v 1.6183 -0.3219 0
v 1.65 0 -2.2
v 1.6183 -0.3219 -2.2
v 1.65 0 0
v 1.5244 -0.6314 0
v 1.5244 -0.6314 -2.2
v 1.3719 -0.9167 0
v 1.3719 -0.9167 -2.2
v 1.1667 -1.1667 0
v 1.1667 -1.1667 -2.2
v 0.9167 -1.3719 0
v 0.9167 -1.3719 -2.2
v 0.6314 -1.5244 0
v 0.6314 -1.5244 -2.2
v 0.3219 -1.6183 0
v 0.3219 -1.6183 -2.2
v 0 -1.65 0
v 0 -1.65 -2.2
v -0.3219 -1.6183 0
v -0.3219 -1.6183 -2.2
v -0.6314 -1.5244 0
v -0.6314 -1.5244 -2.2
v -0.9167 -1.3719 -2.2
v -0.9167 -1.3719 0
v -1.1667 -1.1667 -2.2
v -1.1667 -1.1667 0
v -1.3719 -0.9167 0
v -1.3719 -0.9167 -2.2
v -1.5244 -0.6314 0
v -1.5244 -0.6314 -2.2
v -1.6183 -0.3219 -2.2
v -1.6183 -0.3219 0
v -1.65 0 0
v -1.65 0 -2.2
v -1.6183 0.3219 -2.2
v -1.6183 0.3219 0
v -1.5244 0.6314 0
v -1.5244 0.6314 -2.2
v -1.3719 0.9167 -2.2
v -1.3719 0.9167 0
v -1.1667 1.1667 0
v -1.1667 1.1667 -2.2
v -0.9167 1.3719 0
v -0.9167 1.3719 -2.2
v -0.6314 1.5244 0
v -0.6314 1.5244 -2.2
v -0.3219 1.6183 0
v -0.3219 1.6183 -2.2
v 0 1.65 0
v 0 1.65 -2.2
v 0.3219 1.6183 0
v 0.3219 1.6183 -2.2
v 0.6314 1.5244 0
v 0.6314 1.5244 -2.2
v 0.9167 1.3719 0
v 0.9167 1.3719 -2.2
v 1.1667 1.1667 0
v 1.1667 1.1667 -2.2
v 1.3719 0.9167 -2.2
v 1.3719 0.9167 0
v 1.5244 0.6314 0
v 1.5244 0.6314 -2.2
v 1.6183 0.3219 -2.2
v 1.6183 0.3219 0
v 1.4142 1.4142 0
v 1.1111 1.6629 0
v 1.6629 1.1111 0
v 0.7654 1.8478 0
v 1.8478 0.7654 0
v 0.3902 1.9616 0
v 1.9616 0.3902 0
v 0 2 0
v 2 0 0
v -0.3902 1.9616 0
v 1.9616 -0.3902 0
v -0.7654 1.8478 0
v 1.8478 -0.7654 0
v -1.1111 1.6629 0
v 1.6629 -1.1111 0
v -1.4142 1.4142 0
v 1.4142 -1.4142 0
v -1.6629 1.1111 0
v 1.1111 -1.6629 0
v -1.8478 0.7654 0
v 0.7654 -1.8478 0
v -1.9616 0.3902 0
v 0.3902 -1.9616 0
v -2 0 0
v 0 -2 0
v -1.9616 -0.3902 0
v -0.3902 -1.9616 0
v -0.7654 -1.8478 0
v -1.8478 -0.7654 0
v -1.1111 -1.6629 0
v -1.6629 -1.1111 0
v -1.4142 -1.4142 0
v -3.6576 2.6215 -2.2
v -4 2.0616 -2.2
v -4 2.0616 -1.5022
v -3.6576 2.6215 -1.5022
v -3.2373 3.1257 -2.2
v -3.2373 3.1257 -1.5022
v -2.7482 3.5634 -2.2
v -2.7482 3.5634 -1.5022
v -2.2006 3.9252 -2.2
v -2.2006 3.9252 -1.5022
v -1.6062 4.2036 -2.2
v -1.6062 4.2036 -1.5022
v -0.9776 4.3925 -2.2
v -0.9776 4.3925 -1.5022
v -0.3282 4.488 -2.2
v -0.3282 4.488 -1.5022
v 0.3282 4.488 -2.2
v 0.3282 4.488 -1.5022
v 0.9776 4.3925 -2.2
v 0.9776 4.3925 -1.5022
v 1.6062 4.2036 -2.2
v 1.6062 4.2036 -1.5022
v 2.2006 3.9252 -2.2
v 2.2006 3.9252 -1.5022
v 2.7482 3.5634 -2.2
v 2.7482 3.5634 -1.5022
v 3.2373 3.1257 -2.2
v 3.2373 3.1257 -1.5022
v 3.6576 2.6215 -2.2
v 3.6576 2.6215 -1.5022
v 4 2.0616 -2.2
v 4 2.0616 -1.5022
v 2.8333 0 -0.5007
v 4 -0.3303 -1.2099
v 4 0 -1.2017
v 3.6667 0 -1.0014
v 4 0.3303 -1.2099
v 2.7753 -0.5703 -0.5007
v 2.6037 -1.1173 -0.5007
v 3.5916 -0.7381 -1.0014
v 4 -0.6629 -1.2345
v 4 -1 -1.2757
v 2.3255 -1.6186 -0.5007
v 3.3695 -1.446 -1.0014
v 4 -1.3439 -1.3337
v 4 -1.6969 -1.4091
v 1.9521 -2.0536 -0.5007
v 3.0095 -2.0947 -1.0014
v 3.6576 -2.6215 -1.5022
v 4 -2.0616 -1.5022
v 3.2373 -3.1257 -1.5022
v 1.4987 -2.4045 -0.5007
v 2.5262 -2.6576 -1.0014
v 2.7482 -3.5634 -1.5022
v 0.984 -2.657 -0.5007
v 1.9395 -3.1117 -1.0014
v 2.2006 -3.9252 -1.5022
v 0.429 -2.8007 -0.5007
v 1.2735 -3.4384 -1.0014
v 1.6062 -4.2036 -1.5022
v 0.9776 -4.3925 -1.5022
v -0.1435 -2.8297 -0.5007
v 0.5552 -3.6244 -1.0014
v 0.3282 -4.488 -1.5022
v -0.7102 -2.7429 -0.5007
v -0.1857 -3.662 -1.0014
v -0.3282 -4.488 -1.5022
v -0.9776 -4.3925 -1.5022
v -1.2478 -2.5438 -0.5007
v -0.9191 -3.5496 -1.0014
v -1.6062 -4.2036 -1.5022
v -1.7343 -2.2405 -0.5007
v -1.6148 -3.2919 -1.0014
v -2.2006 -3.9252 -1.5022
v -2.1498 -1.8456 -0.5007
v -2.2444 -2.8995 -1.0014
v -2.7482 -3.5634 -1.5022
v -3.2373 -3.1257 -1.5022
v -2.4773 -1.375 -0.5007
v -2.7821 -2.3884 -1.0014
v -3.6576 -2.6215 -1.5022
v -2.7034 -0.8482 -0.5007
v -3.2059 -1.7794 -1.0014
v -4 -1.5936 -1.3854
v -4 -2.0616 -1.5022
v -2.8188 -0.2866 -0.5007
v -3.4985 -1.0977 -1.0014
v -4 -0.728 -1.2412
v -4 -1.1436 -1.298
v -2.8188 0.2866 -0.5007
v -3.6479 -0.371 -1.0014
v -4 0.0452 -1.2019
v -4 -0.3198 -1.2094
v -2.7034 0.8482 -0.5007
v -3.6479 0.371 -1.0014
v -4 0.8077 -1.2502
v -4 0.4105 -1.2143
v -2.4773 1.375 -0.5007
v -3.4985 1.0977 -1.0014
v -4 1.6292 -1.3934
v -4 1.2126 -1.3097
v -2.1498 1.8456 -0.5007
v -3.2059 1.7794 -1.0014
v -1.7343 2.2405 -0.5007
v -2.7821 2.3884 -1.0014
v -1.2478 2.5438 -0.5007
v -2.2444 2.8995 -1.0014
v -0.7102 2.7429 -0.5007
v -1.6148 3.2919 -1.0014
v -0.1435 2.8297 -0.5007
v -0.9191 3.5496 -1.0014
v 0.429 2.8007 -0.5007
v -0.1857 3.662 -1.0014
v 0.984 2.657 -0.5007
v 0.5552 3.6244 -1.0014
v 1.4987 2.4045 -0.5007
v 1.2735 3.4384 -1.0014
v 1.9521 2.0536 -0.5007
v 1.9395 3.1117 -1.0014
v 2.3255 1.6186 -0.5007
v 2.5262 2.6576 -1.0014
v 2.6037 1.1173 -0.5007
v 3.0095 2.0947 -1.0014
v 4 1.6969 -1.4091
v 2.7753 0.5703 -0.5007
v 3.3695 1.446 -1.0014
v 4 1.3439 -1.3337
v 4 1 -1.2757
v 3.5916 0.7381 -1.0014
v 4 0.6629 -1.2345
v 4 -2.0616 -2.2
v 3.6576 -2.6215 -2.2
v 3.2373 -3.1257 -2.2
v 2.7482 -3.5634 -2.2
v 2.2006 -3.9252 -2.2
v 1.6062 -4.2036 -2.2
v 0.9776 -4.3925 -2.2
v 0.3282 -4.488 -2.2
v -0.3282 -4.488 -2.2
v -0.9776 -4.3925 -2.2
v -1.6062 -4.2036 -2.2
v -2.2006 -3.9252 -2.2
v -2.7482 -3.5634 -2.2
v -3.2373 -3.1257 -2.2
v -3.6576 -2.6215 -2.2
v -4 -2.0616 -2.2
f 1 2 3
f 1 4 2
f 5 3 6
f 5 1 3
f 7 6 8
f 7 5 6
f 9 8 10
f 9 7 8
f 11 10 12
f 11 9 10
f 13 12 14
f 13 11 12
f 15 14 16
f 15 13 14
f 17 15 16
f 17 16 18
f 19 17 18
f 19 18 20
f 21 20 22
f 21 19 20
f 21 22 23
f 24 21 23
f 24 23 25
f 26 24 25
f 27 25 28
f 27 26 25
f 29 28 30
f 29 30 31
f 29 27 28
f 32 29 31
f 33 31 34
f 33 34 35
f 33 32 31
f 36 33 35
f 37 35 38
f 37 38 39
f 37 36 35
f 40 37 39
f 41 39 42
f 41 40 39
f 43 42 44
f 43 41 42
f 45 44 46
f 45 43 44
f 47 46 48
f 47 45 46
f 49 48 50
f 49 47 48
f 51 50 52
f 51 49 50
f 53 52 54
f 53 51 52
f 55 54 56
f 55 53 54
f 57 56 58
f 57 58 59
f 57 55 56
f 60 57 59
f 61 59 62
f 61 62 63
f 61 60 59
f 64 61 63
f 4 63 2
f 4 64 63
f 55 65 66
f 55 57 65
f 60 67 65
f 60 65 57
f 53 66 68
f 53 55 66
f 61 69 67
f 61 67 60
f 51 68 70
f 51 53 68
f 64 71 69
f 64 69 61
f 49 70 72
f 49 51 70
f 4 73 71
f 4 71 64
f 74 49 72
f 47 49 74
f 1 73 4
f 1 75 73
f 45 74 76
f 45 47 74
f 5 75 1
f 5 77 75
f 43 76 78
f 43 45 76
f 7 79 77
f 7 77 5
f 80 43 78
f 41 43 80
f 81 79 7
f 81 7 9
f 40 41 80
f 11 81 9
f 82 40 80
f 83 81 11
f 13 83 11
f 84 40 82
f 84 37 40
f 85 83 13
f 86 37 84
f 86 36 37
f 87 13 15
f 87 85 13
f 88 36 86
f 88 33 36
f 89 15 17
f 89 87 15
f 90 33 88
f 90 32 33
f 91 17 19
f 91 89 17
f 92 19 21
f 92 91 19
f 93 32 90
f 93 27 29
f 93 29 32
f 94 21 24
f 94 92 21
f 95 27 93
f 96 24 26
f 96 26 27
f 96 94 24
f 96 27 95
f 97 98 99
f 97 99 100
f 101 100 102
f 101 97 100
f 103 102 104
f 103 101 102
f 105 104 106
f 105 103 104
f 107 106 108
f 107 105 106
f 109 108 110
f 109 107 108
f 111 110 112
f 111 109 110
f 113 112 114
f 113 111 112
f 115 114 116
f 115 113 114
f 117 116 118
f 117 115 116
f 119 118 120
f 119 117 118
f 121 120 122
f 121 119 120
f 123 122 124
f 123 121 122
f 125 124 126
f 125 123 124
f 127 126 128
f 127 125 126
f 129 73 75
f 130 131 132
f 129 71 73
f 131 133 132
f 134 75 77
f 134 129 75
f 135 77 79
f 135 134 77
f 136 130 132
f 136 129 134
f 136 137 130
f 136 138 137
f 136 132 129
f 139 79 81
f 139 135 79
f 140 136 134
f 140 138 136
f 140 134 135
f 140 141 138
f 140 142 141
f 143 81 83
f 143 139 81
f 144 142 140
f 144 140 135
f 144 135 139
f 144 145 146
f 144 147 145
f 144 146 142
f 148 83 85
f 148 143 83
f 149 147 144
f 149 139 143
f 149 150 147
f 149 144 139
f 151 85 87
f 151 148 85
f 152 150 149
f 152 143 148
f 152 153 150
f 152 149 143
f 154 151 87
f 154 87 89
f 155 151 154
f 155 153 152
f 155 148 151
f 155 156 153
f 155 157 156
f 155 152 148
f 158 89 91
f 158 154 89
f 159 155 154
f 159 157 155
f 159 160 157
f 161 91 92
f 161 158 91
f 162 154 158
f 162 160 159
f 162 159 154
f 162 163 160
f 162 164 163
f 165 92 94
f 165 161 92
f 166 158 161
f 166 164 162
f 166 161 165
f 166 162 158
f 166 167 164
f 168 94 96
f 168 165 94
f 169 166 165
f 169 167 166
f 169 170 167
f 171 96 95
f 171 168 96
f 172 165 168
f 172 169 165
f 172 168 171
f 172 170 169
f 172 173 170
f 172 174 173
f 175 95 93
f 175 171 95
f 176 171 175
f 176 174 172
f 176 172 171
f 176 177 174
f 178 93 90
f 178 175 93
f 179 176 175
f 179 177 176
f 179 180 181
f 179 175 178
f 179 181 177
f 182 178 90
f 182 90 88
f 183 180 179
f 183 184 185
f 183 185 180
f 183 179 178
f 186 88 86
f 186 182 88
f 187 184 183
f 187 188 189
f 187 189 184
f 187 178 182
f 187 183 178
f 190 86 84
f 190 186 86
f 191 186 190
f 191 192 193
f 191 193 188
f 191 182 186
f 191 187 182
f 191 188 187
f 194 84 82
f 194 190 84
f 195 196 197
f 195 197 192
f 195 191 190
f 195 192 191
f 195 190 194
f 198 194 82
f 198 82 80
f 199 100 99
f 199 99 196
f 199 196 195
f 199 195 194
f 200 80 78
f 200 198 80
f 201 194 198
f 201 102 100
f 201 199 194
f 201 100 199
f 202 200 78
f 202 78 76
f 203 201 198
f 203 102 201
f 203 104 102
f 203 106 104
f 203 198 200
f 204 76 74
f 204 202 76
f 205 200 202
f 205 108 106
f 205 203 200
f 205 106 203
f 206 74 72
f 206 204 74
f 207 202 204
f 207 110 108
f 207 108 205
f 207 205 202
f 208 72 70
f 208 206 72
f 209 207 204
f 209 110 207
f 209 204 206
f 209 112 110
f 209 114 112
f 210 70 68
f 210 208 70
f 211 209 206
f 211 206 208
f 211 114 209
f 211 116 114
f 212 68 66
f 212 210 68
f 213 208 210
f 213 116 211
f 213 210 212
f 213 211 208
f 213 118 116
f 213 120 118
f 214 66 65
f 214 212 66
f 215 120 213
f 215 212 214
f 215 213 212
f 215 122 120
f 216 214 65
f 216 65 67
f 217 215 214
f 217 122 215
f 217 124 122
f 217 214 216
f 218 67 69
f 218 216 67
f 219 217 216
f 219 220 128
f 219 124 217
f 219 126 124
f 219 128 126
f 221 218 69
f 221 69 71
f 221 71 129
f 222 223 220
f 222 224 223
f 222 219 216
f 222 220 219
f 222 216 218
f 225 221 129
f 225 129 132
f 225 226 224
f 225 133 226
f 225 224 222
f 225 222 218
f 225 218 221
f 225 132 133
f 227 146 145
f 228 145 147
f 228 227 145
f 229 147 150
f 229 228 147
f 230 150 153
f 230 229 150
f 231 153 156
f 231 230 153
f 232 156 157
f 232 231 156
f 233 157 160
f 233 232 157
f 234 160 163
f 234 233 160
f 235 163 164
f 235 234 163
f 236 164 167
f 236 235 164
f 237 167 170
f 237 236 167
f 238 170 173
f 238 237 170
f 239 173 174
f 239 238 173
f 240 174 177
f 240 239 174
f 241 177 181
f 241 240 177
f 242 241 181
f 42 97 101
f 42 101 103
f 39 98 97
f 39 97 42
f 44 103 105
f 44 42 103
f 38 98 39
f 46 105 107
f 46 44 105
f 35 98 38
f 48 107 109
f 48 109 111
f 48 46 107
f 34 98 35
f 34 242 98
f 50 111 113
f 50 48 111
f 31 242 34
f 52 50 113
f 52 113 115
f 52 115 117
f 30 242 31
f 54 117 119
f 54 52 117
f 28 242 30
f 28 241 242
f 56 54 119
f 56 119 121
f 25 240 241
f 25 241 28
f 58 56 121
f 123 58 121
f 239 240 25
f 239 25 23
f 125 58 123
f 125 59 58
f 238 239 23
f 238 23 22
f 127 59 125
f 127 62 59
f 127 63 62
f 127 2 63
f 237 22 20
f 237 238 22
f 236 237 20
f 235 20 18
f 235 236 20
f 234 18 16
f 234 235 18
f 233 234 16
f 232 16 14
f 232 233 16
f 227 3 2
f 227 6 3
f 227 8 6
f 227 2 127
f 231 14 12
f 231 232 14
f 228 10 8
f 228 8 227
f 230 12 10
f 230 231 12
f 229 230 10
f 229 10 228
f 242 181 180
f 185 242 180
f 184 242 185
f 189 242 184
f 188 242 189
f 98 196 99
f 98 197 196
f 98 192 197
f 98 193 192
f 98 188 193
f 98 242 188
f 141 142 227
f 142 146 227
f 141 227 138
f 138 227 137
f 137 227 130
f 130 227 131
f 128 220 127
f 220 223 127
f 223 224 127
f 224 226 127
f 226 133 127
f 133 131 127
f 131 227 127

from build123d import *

# Parameters (mm, degrees)
SKETCH3_W          = 2.43419071
SKETCH3_H          = 7.16478775
CUT_EXTRUDE1_DEPTH = 3.2


with BuildPart() as part:
    # Sketch2 → Revolve1 (revolve)
    with BuildSketch(Plane(origin=(0, 0, 0), x_dir=(1, 0, 0), z_dir=(0, 1, 0))):
        Polygon((2, 0), (4.5, 1.502151548), (4.5, 2.2), (1.65, 2.2), (1.65, 0), align=None)
    revolve(axis=Axis((0, 0, 0), (0, 0, -1)))

    # Sketch3 → Cut-Extrude1 (cut, through all)
    with BuildSketch(Plane(origin=(0, 0, -2.2), x_dir=(-1, 0, 0), z_dir=(0, 0, -1))):
        with Locations((-5.217095355, -0.122475004)):
            Rectangle(SKETCH3_W, SKETCH3_H)
    cut_extrude1 = extrude(amount=-CUT_EXTRUDE1_DEPTH, mode=Mode.SUBTRACT)

    # Mirror1: Cut-Extrude1 across plane
    add(cut_extrude1.mirror(Plane(origin=(0, 0, 0), x_dir=(0, 0, 1), z_dir=(1, 0, 0))), mode=Mode.SUBTRACT)


solid = part.part
